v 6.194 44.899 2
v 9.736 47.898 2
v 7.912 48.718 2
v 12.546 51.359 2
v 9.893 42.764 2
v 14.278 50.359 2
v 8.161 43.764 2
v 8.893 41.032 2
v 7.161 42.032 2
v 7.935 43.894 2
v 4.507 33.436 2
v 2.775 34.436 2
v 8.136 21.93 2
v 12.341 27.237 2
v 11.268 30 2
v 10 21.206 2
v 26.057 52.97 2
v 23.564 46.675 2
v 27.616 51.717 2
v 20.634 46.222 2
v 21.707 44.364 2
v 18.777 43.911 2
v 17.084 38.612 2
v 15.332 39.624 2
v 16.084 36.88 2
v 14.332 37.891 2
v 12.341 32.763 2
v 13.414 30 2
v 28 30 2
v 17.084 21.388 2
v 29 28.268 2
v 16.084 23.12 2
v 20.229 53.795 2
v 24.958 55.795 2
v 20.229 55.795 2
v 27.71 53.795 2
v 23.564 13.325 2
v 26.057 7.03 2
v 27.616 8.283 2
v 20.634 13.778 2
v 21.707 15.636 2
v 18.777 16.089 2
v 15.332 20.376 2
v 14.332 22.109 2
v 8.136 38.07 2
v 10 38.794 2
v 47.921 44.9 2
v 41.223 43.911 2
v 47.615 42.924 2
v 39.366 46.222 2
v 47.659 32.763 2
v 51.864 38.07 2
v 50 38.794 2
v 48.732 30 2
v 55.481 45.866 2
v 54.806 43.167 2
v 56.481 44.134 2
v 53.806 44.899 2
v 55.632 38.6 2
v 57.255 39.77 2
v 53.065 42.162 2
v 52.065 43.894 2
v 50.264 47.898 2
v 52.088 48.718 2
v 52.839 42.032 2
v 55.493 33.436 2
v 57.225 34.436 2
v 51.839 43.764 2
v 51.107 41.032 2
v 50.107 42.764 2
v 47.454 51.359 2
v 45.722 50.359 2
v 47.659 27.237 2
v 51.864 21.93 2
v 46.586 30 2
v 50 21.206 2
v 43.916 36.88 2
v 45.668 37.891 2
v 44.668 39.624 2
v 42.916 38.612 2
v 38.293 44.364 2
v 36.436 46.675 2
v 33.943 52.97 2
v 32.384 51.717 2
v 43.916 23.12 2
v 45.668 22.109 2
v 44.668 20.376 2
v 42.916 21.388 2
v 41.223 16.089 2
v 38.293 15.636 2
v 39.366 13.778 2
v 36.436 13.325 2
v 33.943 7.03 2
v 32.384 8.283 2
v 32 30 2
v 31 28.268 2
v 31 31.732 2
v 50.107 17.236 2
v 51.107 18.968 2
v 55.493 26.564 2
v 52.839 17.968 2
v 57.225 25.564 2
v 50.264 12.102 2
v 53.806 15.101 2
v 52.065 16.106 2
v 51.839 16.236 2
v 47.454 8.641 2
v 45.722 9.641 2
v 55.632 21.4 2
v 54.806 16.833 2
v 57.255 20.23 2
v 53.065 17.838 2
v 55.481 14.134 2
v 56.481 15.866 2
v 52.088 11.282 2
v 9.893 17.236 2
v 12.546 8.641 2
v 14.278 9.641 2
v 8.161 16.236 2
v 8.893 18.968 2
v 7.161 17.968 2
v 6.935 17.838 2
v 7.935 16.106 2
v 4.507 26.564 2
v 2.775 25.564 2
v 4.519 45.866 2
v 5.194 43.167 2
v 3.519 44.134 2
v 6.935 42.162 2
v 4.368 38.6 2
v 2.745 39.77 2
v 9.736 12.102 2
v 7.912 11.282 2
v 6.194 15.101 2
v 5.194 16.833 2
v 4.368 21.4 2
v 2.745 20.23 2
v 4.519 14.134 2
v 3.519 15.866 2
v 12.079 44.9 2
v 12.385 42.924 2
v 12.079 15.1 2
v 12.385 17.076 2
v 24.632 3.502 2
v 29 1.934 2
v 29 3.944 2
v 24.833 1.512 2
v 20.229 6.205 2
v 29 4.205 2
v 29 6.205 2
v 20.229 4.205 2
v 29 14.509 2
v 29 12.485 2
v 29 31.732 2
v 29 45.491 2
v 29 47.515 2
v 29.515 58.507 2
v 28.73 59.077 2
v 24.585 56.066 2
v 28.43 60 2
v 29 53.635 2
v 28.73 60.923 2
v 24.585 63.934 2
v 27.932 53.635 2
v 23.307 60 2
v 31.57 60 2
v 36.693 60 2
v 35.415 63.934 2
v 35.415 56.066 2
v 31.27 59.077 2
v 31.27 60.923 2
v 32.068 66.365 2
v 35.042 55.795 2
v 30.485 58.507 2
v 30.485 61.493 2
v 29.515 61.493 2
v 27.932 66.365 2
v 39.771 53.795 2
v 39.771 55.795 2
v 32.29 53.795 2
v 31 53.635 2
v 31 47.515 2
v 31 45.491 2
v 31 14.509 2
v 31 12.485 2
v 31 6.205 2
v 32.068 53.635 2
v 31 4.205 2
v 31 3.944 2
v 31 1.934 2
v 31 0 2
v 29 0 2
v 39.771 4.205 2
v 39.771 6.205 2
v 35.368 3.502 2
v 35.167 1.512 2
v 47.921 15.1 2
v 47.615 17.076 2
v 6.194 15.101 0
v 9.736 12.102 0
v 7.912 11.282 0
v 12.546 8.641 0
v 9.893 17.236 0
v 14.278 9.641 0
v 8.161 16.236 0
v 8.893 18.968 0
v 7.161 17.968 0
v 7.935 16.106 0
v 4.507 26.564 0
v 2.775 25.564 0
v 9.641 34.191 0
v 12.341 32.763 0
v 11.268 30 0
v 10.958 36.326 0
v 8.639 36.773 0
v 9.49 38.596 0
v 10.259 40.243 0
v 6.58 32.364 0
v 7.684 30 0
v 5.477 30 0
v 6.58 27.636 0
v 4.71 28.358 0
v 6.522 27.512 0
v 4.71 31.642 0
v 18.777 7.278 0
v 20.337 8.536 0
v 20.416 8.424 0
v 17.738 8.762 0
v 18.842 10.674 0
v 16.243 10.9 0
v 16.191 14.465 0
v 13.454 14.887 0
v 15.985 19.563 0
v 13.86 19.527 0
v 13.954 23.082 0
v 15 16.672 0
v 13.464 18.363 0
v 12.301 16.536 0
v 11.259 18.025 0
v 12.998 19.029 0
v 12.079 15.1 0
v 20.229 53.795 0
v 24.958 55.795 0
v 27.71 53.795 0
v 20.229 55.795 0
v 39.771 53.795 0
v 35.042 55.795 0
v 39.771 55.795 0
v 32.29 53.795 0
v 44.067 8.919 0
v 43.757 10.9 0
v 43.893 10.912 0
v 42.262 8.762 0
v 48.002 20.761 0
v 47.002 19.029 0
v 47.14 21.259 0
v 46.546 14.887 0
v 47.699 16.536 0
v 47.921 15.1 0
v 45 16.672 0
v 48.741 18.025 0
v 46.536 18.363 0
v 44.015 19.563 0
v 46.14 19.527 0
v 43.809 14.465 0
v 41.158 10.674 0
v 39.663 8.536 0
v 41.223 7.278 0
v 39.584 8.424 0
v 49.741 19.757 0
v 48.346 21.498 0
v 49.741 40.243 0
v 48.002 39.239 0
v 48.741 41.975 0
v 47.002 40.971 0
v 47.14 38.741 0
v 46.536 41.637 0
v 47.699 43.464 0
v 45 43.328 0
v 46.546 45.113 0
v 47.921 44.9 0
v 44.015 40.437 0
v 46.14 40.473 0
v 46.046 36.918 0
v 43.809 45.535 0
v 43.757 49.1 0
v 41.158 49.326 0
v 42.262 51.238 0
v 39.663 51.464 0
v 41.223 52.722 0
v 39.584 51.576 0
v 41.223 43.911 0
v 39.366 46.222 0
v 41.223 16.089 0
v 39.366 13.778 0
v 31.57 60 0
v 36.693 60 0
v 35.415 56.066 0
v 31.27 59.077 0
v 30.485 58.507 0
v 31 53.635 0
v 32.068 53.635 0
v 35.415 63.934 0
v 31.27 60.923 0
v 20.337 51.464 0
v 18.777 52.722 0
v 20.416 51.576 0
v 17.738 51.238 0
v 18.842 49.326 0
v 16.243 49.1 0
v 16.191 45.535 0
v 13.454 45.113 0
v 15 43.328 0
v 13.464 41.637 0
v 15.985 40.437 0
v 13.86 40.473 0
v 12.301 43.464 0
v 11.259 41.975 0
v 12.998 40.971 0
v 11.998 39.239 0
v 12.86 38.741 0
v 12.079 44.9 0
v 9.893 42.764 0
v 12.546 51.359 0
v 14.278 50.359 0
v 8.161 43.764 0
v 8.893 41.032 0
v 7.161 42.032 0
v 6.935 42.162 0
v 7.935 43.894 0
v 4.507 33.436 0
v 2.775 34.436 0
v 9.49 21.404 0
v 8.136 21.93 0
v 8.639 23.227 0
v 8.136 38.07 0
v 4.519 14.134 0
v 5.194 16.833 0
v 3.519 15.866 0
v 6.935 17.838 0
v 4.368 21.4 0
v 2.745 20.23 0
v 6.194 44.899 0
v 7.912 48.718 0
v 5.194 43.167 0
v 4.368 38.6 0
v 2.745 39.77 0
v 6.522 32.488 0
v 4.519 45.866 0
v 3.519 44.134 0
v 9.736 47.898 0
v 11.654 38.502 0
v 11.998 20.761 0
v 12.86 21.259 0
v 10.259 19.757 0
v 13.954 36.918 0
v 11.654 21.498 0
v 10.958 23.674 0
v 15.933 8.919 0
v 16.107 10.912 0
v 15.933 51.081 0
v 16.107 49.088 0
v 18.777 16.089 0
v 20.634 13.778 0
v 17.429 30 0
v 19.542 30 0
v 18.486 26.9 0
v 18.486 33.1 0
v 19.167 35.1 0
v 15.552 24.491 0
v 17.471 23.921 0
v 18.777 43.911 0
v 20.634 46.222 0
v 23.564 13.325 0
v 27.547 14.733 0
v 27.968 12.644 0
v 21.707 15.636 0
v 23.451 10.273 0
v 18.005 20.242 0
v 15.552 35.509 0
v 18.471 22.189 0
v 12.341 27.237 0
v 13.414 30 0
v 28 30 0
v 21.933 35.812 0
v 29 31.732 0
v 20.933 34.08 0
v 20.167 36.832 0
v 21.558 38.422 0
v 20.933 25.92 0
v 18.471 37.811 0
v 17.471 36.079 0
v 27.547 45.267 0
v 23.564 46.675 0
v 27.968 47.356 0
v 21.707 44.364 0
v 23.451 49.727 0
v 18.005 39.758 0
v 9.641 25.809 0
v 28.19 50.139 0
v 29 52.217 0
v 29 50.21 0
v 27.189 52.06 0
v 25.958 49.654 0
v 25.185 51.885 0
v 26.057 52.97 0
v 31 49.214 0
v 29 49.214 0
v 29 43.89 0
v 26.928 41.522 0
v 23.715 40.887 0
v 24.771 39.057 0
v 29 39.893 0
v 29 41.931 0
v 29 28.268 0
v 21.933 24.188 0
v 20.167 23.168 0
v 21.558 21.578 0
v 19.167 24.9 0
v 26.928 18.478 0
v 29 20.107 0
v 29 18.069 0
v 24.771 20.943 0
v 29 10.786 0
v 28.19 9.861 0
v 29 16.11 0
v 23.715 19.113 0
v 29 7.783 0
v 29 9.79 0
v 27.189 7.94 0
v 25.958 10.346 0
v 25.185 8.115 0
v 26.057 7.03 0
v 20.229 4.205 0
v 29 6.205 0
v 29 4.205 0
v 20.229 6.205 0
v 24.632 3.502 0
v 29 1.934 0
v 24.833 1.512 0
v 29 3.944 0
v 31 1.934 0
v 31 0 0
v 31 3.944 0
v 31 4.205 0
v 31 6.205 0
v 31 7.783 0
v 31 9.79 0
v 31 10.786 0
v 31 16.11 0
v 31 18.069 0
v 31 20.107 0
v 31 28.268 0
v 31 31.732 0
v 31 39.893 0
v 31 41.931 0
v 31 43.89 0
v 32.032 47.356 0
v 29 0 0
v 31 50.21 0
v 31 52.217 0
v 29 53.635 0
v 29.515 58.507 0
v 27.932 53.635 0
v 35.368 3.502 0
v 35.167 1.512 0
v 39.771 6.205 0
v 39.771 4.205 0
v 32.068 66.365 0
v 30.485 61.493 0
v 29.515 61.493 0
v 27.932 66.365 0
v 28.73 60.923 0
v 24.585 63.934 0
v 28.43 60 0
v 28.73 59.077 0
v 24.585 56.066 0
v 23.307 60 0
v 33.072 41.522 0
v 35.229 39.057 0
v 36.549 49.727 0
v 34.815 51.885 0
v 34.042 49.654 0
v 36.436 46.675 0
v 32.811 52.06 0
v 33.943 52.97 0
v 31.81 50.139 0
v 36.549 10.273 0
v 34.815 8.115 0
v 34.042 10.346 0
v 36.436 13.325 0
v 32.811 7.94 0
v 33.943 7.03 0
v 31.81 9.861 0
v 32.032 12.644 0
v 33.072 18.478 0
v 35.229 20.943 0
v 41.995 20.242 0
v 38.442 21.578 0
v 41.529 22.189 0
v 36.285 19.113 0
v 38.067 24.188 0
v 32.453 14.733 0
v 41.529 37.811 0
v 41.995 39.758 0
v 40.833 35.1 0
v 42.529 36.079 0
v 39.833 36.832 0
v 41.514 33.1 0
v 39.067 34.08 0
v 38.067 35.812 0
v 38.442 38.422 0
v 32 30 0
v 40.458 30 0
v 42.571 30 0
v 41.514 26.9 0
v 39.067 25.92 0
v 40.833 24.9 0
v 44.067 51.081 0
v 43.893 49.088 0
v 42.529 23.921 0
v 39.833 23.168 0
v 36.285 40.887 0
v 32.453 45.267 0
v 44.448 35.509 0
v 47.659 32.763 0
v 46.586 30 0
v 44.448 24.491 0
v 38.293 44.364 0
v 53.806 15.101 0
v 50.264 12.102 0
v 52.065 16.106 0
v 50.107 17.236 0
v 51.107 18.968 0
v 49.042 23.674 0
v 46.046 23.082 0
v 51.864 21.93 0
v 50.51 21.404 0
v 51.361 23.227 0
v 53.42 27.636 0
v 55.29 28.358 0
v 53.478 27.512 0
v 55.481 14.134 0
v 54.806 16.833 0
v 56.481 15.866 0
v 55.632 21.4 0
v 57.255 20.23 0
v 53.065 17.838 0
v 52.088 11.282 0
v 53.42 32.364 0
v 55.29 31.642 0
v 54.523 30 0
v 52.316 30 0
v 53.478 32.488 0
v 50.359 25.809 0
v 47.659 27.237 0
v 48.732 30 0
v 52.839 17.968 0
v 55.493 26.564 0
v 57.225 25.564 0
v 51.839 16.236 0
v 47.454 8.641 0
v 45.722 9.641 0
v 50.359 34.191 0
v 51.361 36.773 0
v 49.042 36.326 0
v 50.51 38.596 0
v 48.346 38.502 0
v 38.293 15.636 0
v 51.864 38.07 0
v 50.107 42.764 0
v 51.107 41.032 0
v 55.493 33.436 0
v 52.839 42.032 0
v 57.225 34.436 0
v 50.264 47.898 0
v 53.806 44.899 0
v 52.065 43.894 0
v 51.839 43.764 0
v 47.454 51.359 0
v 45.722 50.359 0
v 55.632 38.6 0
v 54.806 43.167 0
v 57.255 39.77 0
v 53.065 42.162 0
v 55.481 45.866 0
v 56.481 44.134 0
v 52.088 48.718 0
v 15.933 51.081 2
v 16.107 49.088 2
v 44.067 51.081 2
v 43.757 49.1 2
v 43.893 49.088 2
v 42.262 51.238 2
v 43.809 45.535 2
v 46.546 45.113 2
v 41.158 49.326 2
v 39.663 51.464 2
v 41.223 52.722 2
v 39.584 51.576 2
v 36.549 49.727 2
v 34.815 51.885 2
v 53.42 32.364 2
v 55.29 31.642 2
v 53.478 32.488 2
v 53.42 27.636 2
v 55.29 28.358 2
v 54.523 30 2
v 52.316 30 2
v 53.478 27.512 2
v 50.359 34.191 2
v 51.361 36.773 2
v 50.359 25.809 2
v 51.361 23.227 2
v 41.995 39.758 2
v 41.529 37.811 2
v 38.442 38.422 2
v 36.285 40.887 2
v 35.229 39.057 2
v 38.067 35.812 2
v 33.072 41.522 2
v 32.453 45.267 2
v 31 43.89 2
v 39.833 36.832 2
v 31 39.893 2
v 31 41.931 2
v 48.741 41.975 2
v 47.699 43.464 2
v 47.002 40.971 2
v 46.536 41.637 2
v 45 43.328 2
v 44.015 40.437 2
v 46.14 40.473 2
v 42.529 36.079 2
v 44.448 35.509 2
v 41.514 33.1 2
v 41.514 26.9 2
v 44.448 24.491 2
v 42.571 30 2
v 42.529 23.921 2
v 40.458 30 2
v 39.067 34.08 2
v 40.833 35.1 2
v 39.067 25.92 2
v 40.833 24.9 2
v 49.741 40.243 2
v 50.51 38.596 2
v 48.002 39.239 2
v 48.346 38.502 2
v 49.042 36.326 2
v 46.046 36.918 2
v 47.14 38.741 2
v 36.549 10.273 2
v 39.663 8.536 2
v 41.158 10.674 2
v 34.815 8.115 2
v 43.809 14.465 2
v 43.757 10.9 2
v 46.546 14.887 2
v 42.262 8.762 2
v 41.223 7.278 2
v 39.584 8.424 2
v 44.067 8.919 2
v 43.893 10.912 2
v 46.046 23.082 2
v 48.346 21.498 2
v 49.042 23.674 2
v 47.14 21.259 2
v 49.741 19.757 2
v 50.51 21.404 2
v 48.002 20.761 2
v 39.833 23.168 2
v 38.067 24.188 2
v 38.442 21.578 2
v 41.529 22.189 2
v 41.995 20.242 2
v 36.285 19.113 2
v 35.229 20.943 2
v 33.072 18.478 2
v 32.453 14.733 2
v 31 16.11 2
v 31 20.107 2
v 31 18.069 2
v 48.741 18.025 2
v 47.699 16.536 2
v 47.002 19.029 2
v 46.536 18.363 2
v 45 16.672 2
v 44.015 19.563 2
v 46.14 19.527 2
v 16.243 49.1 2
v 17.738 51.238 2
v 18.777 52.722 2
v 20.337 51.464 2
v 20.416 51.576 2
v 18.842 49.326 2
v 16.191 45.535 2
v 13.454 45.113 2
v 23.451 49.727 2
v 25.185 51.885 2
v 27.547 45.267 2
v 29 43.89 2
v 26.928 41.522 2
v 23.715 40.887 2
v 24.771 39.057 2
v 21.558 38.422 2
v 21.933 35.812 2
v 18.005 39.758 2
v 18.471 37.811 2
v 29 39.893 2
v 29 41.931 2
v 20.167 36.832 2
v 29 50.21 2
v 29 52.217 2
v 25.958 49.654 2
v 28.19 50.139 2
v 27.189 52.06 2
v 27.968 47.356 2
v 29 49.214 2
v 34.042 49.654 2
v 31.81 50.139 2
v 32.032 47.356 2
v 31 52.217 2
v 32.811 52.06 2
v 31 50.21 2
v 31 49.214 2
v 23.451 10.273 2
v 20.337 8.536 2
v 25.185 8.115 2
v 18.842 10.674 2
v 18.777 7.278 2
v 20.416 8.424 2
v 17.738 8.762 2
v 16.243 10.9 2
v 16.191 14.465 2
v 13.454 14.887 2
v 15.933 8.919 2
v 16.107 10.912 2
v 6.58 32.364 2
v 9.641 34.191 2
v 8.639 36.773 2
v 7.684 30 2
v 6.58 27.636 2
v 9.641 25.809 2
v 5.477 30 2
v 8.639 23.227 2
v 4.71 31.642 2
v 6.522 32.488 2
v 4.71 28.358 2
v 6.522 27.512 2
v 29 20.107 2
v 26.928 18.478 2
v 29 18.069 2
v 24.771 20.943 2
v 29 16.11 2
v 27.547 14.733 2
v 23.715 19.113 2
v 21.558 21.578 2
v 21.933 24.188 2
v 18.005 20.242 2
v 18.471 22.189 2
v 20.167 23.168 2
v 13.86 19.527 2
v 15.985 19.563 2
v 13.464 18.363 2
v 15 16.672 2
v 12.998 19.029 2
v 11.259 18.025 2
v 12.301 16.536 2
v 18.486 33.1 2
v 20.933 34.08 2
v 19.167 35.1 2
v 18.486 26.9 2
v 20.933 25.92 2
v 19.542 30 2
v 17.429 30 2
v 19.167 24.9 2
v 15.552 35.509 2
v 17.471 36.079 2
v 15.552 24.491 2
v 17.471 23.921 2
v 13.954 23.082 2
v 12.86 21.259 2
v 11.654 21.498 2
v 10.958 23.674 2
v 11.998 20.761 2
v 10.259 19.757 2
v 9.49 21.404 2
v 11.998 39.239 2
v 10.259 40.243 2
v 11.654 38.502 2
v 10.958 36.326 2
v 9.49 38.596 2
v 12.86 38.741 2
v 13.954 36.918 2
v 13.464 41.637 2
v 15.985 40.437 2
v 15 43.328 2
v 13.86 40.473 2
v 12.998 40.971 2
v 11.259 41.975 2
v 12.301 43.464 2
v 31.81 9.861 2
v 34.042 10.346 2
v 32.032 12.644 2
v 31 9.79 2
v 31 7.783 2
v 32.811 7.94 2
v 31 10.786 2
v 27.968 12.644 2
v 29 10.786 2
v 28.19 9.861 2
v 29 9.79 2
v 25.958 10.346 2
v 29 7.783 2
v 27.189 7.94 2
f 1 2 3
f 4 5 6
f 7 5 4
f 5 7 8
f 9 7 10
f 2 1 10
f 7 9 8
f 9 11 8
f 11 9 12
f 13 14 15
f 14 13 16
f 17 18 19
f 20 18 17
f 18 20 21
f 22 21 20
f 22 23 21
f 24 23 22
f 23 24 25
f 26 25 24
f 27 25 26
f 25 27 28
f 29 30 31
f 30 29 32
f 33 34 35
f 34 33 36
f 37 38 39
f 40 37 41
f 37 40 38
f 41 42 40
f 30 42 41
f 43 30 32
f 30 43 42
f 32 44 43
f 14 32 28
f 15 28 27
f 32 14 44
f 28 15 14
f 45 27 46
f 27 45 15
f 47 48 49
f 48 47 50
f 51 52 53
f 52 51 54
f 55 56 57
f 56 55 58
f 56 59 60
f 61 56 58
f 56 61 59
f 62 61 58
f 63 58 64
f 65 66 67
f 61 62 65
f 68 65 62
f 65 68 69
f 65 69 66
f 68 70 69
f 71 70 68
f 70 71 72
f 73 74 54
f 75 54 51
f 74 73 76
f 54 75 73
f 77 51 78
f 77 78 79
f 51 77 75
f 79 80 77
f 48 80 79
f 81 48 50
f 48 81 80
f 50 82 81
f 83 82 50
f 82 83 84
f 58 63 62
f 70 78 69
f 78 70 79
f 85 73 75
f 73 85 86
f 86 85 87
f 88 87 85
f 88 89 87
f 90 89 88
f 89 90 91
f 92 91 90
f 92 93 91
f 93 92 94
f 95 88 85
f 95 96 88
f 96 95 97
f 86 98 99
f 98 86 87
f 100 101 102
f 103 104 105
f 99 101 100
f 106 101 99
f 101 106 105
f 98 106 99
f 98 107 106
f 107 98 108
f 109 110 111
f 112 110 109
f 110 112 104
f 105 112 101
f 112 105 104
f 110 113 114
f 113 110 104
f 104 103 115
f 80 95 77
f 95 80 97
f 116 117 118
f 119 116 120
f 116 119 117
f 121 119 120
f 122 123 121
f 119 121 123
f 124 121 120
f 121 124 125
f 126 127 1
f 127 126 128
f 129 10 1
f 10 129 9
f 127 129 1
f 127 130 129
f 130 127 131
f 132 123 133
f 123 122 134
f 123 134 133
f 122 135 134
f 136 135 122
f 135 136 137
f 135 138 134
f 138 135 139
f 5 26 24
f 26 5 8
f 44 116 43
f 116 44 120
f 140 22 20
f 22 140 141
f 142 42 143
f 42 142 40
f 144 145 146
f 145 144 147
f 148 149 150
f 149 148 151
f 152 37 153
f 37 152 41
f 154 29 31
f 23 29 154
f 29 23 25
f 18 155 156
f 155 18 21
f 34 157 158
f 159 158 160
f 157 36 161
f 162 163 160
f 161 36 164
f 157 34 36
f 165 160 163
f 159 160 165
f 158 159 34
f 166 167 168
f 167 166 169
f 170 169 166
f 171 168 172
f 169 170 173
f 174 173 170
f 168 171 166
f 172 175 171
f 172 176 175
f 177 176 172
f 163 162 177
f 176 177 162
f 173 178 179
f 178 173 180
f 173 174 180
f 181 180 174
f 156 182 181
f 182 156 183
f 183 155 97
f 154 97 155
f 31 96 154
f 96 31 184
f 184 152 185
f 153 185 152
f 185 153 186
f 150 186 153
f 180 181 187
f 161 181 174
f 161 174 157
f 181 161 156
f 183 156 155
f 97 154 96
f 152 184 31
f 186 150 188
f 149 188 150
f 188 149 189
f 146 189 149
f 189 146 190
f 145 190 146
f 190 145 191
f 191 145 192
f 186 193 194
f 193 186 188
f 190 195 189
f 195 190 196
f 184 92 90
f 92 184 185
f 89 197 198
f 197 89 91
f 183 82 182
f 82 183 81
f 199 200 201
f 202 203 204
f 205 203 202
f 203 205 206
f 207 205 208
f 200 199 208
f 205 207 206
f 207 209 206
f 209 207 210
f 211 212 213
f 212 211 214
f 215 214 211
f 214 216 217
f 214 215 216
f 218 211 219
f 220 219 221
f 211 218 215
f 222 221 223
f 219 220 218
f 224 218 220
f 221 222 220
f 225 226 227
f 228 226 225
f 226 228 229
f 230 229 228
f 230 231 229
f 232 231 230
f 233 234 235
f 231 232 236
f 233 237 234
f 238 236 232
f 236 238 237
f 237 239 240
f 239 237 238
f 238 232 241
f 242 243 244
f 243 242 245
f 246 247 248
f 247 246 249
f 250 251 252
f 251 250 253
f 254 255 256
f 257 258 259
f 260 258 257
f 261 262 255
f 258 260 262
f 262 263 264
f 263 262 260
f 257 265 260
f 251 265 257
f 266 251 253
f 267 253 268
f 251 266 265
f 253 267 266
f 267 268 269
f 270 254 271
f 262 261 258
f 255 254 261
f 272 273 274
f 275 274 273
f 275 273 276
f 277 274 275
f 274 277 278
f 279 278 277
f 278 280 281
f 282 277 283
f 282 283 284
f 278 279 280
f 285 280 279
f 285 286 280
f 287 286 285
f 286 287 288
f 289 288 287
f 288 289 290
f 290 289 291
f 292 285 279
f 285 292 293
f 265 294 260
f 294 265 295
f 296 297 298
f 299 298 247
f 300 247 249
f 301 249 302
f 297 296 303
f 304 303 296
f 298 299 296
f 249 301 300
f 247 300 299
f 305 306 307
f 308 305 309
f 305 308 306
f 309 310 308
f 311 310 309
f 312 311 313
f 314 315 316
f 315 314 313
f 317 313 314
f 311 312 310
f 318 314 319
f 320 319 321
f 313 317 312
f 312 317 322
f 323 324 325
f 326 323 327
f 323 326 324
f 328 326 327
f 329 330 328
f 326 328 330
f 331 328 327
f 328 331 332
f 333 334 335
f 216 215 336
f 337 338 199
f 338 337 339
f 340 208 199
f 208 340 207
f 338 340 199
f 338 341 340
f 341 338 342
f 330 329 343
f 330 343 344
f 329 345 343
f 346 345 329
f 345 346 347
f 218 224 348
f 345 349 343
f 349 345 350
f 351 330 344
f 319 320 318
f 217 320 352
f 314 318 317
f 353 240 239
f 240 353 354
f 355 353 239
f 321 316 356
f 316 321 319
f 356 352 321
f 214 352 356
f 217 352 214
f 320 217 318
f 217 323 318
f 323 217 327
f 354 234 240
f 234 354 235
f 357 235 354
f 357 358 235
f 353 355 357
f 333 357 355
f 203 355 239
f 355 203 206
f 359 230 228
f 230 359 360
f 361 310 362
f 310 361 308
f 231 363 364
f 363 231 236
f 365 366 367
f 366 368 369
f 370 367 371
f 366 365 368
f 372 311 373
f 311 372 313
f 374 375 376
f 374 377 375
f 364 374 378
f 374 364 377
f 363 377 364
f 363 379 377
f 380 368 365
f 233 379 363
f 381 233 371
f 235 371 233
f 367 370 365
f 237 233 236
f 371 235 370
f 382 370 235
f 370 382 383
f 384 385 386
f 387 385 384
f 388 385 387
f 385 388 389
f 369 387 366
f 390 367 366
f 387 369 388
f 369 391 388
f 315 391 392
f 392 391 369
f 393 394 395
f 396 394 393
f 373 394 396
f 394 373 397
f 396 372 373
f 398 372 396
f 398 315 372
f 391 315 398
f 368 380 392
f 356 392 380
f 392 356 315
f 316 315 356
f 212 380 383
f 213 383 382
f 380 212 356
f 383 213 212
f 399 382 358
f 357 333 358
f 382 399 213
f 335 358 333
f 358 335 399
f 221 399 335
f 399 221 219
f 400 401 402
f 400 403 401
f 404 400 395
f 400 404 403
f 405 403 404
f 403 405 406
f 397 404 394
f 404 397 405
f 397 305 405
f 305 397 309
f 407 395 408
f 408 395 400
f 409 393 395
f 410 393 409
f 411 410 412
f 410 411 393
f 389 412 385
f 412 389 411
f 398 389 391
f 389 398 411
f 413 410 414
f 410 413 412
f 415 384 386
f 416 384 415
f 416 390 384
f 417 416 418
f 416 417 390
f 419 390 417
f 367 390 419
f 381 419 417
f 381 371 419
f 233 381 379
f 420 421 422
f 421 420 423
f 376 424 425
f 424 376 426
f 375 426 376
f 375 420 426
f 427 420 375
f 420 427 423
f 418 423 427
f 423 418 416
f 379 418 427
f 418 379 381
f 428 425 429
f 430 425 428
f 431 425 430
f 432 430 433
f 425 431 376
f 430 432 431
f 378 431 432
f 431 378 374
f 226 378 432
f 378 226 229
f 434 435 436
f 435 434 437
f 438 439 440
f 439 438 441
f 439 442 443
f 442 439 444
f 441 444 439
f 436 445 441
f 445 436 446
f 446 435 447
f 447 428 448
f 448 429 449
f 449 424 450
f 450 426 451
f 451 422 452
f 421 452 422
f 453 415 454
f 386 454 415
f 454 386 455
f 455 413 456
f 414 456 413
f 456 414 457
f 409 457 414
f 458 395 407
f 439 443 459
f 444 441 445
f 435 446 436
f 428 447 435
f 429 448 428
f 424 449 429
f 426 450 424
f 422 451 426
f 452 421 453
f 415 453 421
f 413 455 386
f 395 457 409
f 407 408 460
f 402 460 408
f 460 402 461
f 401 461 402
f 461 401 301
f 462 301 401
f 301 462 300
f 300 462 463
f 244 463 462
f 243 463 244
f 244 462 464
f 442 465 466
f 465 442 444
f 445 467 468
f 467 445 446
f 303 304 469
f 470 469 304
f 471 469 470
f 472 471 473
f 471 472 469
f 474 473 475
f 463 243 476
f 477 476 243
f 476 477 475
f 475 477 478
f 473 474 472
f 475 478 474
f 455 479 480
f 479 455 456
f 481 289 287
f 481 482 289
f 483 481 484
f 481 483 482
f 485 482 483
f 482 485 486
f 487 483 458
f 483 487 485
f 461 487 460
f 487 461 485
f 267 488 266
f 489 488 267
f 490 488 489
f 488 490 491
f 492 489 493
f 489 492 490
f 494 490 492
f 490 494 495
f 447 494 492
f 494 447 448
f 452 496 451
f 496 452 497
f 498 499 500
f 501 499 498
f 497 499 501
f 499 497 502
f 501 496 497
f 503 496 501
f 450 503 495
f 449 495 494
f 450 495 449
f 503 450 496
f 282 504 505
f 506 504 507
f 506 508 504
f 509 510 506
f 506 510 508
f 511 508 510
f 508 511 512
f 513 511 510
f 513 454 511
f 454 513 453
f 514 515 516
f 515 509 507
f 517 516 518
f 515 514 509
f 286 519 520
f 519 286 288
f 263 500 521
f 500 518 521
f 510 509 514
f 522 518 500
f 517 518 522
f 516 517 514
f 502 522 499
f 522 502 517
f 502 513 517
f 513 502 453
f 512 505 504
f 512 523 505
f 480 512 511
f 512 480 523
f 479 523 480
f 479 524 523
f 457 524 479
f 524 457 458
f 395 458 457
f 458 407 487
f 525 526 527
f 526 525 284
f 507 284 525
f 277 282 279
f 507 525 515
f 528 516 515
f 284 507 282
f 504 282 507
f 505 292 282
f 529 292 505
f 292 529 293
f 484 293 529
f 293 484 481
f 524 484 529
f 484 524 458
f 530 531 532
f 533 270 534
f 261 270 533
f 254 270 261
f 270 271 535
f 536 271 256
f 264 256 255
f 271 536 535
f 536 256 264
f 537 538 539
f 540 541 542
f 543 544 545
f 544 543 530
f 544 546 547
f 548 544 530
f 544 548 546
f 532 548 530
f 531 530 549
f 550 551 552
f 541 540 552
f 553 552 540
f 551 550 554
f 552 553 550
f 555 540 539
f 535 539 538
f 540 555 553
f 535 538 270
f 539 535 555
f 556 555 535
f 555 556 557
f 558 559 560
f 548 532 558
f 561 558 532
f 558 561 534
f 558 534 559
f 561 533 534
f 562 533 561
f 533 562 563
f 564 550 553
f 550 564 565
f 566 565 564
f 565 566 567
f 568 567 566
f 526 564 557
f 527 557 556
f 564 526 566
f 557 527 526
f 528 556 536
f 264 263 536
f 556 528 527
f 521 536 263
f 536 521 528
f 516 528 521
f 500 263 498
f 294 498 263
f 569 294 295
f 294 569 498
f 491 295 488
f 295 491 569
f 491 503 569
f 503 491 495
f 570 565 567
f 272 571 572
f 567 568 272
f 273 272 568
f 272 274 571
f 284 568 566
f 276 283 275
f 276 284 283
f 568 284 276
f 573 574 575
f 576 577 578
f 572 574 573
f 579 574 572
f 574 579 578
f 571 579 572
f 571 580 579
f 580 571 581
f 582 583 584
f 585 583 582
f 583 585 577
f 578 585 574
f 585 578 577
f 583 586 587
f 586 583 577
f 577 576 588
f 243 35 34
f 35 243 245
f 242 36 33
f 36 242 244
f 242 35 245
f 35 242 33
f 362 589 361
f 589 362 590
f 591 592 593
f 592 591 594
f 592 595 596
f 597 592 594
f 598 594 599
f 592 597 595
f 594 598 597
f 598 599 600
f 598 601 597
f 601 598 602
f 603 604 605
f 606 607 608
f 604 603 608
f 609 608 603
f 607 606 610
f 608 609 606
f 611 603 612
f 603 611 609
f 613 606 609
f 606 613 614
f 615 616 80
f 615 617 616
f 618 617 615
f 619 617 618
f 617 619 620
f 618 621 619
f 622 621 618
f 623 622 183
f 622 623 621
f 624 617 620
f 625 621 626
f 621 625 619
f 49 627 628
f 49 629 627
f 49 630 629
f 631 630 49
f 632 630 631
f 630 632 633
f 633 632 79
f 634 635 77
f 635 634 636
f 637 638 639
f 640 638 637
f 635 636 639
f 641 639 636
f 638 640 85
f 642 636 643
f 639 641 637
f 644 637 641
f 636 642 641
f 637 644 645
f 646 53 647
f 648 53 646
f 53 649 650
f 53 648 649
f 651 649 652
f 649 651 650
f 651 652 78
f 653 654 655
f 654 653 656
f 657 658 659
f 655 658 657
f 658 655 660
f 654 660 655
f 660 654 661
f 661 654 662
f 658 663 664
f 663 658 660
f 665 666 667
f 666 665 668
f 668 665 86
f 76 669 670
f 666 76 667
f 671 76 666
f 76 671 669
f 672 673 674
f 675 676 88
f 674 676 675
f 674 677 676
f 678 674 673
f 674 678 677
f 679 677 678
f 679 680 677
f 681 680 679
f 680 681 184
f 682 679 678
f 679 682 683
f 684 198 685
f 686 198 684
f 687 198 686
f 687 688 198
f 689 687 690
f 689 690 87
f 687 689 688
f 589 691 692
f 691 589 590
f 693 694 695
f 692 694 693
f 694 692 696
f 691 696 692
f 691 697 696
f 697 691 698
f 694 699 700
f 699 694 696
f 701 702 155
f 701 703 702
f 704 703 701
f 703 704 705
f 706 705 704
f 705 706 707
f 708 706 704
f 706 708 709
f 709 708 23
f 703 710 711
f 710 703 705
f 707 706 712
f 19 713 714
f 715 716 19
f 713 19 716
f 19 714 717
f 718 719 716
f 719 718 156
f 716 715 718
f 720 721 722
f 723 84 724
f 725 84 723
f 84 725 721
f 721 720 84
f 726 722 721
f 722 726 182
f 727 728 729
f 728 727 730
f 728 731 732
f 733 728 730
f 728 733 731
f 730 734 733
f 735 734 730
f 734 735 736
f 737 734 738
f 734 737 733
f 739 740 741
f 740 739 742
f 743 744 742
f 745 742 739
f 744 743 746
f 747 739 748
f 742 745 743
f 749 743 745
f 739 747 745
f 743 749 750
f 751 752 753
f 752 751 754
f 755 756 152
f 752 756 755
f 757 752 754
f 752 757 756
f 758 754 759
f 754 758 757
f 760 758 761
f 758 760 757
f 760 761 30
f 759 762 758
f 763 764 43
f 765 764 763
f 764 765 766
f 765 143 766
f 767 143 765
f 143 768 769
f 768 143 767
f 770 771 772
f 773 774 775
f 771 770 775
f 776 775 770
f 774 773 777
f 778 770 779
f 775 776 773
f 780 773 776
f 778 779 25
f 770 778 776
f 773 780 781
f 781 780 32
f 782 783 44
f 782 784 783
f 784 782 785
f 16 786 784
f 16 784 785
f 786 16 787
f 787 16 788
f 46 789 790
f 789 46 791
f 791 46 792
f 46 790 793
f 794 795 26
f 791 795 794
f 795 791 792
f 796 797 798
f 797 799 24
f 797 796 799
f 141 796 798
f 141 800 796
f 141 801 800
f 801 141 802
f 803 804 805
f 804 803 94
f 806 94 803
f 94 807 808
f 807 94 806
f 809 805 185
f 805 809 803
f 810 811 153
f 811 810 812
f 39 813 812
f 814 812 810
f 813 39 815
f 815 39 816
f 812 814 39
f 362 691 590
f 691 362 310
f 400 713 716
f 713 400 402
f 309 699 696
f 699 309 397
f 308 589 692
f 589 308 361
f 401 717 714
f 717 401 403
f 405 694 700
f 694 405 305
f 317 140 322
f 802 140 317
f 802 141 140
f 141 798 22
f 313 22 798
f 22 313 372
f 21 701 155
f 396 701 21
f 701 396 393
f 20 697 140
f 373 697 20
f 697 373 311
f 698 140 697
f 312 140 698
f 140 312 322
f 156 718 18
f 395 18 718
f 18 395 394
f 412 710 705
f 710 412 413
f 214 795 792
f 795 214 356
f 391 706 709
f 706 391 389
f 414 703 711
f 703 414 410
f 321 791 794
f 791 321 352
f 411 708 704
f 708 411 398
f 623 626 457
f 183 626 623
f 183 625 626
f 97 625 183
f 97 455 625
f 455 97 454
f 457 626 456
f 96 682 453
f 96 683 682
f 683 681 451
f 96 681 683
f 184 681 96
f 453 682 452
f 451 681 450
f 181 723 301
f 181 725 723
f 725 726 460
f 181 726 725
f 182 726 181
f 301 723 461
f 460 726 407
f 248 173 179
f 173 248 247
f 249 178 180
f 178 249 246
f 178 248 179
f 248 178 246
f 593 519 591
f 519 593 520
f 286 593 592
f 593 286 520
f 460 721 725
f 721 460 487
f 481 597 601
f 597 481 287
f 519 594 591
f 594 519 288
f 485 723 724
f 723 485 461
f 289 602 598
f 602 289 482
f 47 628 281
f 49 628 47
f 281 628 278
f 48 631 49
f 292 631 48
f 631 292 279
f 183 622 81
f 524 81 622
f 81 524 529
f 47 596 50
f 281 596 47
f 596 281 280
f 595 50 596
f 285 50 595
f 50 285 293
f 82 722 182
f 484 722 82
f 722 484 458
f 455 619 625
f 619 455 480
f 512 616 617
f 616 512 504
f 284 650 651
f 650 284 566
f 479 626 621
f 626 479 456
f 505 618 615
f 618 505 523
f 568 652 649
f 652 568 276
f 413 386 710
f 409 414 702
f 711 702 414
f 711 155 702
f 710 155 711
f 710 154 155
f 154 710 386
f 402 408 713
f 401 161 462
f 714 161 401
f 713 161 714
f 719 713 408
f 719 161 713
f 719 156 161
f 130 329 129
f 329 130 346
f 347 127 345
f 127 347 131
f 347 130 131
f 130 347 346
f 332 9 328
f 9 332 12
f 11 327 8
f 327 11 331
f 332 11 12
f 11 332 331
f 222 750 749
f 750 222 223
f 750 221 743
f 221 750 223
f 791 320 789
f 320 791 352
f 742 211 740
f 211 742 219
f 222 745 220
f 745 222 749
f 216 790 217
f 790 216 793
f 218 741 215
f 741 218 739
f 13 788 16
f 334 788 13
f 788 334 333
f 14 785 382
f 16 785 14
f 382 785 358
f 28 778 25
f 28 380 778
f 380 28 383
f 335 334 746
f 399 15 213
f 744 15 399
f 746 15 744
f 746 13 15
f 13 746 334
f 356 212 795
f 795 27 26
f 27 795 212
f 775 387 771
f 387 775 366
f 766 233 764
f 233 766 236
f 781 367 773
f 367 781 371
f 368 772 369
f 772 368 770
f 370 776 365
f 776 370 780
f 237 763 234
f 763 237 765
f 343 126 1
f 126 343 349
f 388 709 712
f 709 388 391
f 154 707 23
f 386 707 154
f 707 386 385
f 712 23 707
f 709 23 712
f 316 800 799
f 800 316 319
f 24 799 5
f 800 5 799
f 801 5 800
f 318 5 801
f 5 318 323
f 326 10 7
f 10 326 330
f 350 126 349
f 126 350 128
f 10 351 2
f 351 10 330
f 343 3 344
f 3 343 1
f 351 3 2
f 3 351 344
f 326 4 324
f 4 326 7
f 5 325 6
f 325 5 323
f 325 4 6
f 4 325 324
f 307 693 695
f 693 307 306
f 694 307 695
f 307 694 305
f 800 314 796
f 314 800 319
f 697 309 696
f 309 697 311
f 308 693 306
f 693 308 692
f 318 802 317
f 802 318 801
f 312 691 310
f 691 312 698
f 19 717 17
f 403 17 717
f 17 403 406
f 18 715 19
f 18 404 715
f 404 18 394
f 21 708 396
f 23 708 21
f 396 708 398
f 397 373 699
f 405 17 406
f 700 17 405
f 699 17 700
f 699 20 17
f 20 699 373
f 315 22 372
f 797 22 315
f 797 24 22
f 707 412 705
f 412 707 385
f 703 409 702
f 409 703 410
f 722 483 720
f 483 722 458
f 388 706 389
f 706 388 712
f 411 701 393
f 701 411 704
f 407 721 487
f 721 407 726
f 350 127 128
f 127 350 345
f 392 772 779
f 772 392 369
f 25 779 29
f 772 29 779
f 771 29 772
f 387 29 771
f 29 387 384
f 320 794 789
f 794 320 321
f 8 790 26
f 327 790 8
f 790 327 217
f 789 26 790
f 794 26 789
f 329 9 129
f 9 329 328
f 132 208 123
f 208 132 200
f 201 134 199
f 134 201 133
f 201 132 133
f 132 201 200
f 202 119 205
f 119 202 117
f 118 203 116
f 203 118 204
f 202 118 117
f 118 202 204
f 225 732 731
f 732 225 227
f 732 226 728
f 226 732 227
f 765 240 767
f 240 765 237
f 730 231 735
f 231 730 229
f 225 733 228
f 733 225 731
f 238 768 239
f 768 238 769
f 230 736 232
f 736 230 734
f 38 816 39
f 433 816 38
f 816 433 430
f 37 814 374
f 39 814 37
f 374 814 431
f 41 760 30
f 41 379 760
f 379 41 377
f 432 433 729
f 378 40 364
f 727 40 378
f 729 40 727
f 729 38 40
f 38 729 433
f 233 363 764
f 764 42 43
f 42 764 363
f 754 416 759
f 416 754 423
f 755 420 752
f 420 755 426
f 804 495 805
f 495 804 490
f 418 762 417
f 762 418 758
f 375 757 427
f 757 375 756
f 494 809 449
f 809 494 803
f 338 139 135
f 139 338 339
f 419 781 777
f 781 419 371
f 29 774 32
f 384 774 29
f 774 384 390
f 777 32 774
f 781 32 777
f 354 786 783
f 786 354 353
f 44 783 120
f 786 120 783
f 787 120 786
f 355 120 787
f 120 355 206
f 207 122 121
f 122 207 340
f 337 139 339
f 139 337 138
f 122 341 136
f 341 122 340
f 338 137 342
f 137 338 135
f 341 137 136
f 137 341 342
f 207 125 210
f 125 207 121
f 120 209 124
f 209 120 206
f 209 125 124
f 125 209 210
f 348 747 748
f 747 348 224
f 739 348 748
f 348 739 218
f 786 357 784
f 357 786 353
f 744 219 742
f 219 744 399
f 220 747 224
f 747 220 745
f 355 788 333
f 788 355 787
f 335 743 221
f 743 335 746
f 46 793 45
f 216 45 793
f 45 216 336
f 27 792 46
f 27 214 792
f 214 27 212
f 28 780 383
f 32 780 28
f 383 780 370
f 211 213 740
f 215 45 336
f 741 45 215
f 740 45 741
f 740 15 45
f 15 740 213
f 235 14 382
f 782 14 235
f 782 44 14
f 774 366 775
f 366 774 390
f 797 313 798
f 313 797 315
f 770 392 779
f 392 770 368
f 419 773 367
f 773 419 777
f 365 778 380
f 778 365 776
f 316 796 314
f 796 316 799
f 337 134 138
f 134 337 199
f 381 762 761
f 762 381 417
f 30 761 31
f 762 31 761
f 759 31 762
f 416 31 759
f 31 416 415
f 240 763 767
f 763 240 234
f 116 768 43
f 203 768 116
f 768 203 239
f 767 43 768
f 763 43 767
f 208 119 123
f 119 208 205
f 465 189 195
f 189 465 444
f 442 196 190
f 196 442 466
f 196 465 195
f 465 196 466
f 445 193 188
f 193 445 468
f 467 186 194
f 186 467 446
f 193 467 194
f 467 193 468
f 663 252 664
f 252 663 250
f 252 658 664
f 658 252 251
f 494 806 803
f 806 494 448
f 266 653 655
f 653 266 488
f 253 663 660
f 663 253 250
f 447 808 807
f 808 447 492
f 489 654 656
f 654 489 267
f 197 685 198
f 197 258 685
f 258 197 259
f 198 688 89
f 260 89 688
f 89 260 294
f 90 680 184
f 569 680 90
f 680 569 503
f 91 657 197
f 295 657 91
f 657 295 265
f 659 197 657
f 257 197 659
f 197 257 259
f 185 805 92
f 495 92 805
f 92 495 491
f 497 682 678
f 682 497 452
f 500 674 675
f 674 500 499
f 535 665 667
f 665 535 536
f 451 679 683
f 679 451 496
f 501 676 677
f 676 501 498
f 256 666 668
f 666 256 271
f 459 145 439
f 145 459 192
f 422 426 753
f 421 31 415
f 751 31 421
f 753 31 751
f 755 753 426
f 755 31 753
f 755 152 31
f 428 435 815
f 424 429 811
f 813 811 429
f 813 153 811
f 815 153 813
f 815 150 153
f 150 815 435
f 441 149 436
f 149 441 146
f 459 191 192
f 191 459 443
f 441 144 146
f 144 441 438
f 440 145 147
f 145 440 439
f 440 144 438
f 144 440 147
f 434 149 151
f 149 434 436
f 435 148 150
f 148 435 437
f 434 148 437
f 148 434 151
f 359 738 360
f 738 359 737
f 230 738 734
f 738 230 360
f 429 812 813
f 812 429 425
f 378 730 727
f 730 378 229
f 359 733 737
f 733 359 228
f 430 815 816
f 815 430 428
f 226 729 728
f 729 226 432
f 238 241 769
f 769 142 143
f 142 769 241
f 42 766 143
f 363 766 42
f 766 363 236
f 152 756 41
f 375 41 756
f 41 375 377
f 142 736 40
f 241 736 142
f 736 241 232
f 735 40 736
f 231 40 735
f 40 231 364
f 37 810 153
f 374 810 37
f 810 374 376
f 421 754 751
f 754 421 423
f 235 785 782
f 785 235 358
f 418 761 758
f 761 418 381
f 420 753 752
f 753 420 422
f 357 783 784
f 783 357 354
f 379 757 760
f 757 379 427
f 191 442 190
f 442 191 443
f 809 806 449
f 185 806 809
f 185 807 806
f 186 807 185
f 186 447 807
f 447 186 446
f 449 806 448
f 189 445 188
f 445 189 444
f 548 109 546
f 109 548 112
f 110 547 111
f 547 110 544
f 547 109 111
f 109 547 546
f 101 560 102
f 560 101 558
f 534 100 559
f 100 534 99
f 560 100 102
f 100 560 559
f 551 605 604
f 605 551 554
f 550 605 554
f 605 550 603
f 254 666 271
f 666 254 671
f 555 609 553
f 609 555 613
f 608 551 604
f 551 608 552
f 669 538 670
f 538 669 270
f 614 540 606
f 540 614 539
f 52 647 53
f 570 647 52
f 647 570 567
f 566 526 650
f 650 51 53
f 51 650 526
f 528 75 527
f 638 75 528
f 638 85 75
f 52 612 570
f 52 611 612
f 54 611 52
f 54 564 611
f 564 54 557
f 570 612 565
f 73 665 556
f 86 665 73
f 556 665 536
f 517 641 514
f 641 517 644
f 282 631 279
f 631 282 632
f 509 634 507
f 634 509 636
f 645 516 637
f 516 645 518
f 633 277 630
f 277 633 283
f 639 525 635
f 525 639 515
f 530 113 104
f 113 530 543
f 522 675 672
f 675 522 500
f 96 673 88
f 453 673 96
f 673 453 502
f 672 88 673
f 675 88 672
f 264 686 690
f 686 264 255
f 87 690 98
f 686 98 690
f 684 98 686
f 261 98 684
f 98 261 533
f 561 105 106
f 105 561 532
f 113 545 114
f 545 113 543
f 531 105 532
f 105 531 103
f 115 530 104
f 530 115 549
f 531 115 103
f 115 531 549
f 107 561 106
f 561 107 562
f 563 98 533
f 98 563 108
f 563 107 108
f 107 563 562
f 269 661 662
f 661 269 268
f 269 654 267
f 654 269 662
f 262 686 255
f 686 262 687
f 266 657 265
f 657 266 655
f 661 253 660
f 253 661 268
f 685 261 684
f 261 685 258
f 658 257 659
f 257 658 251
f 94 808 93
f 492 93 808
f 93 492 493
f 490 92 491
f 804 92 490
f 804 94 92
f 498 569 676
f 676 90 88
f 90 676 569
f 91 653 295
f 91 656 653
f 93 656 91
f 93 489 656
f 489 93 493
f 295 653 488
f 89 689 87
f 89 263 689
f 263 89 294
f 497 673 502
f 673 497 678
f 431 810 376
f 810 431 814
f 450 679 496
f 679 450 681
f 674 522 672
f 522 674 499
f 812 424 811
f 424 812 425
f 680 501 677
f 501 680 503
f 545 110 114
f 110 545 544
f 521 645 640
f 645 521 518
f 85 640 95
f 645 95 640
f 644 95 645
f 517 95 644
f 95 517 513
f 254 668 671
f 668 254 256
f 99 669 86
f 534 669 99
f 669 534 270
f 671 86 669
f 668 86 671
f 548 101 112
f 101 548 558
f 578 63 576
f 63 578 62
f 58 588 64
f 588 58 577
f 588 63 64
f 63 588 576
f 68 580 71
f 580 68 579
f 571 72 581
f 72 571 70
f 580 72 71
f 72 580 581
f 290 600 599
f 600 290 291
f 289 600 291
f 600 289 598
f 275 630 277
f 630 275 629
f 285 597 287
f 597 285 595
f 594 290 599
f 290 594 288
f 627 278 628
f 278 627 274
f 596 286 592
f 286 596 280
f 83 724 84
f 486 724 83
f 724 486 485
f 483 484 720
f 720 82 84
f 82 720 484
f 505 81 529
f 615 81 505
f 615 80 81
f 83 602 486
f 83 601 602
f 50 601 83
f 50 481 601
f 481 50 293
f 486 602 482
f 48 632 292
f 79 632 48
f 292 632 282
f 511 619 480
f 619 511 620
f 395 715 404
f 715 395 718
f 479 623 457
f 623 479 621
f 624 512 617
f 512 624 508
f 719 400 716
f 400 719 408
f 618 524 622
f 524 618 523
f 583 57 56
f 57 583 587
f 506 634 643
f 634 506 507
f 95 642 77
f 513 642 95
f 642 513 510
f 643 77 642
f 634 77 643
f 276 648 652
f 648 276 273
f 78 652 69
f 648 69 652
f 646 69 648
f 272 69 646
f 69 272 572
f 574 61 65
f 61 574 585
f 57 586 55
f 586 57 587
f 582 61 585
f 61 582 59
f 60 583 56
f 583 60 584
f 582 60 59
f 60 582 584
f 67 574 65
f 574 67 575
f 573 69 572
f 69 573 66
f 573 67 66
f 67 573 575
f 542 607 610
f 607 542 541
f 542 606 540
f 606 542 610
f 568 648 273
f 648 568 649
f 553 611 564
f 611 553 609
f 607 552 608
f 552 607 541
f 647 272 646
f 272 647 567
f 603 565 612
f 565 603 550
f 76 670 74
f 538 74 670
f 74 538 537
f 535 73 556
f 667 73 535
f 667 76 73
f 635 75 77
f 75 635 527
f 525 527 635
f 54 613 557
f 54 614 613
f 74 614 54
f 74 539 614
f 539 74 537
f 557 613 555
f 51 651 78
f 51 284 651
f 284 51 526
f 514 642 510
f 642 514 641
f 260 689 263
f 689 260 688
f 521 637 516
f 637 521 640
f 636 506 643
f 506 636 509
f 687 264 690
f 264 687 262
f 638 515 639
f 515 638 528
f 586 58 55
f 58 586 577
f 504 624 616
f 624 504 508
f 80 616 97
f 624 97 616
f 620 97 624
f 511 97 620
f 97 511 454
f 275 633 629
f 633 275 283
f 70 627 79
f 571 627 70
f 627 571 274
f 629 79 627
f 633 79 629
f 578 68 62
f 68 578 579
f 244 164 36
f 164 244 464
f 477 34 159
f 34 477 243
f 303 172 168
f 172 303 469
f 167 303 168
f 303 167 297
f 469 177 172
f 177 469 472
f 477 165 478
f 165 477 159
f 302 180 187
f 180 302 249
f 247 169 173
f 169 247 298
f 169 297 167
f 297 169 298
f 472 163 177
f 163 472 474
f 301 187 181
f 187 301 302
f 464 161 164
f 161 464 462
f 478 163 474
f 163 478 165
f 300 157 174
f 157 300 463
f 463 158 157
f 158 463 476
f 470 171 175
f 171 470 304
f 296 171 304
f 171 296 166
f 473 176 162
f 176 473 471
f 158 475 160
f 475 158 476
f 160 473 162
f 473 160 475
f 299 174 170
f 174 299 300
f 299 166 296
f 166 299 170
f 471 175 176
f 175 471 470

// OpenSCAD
//Paramètres commun d'un flocon de neige

Nombre_de_bras = 6;
Longueur_de_la_branche =30;
Angle_des_branches = 24;
Epaisseur_des_branches = 2;
Epaisseur = 2;
Nombre_de_branches = 5; //inférieur à 40
germe =7; //un nombre entre 1 et 7

module tree(Longueur_de_la_branche,Angle_des_branches, Epaisseur_des_branches, Epaisseur,Nombre_de_branches,germe){
	module half_tree(){
		cube([Epaisseur_des_branches/2,Longueur_de_la_branche,Epaisseur]);

		for ( i = [1:Nombre_de_branches]){
			translate([0, (Longueur_de_la_branche-1.3)*cos(i*13), 0]) 
			rotate(Angle_des_branches*(germe+sin(i*15))) 
			cube([Longueur_de_la_branche*sin(i*(2+germe))+0.5, Epaisseur_des_branches, Epaisseur]);
		}
	}

	half_tree(Longueur_de_la_branche, Angle_des_branches,Epaisseur_des_branches, Epaisseur,Nombre_de_branches, germe);
	mirror()half_tree(Longueur_de_la_branche, Angle_des_branches, Epaisseur, Nombre_de_branches, germe);
}

module snowflake(Nombre_de_bras, Longueur_de_la_branche, Angle_des_branches, Epaisseur_des_branches, Epaisseur, Nombre_de_branches, germe){
	hole_dist = Longueur_de_la_branche;
	translate([0,Longueur_de_la_branche,0])cylinder(h=Epaisseur, r=Longueur_de_la_branche*sin(1*(2+germe))+Epaisseur_des_branches, $fn=10);
		for ( i = [0:Nombre_de_bras-1]){
			rotate( i*360/Nombre_de_bras, [0,0,1])
			tree(Longueur_de_la_branche,Angle_des_branches, Epaisseur_des_branches, Epaisseur,Nombre_de_branches,germe);
		}
}

translate([Longueur_de_la_branche,Longueur_de_la_branche,0]){
difference(){

snowflake(
	Nombre_de_bras, 
	Longueur_de_la_branche, 
	Angle_des_branches,
	Epaisseur_des_branches,
	Epaisseur,
	Nombre_de_branches,
	germe
);
translate([0,Longueur_de_la_branche,-2])cylinder(h=Epaisseur*2, r=Longueur_de_la_branche*sin(3), $fn=10);
}
}
